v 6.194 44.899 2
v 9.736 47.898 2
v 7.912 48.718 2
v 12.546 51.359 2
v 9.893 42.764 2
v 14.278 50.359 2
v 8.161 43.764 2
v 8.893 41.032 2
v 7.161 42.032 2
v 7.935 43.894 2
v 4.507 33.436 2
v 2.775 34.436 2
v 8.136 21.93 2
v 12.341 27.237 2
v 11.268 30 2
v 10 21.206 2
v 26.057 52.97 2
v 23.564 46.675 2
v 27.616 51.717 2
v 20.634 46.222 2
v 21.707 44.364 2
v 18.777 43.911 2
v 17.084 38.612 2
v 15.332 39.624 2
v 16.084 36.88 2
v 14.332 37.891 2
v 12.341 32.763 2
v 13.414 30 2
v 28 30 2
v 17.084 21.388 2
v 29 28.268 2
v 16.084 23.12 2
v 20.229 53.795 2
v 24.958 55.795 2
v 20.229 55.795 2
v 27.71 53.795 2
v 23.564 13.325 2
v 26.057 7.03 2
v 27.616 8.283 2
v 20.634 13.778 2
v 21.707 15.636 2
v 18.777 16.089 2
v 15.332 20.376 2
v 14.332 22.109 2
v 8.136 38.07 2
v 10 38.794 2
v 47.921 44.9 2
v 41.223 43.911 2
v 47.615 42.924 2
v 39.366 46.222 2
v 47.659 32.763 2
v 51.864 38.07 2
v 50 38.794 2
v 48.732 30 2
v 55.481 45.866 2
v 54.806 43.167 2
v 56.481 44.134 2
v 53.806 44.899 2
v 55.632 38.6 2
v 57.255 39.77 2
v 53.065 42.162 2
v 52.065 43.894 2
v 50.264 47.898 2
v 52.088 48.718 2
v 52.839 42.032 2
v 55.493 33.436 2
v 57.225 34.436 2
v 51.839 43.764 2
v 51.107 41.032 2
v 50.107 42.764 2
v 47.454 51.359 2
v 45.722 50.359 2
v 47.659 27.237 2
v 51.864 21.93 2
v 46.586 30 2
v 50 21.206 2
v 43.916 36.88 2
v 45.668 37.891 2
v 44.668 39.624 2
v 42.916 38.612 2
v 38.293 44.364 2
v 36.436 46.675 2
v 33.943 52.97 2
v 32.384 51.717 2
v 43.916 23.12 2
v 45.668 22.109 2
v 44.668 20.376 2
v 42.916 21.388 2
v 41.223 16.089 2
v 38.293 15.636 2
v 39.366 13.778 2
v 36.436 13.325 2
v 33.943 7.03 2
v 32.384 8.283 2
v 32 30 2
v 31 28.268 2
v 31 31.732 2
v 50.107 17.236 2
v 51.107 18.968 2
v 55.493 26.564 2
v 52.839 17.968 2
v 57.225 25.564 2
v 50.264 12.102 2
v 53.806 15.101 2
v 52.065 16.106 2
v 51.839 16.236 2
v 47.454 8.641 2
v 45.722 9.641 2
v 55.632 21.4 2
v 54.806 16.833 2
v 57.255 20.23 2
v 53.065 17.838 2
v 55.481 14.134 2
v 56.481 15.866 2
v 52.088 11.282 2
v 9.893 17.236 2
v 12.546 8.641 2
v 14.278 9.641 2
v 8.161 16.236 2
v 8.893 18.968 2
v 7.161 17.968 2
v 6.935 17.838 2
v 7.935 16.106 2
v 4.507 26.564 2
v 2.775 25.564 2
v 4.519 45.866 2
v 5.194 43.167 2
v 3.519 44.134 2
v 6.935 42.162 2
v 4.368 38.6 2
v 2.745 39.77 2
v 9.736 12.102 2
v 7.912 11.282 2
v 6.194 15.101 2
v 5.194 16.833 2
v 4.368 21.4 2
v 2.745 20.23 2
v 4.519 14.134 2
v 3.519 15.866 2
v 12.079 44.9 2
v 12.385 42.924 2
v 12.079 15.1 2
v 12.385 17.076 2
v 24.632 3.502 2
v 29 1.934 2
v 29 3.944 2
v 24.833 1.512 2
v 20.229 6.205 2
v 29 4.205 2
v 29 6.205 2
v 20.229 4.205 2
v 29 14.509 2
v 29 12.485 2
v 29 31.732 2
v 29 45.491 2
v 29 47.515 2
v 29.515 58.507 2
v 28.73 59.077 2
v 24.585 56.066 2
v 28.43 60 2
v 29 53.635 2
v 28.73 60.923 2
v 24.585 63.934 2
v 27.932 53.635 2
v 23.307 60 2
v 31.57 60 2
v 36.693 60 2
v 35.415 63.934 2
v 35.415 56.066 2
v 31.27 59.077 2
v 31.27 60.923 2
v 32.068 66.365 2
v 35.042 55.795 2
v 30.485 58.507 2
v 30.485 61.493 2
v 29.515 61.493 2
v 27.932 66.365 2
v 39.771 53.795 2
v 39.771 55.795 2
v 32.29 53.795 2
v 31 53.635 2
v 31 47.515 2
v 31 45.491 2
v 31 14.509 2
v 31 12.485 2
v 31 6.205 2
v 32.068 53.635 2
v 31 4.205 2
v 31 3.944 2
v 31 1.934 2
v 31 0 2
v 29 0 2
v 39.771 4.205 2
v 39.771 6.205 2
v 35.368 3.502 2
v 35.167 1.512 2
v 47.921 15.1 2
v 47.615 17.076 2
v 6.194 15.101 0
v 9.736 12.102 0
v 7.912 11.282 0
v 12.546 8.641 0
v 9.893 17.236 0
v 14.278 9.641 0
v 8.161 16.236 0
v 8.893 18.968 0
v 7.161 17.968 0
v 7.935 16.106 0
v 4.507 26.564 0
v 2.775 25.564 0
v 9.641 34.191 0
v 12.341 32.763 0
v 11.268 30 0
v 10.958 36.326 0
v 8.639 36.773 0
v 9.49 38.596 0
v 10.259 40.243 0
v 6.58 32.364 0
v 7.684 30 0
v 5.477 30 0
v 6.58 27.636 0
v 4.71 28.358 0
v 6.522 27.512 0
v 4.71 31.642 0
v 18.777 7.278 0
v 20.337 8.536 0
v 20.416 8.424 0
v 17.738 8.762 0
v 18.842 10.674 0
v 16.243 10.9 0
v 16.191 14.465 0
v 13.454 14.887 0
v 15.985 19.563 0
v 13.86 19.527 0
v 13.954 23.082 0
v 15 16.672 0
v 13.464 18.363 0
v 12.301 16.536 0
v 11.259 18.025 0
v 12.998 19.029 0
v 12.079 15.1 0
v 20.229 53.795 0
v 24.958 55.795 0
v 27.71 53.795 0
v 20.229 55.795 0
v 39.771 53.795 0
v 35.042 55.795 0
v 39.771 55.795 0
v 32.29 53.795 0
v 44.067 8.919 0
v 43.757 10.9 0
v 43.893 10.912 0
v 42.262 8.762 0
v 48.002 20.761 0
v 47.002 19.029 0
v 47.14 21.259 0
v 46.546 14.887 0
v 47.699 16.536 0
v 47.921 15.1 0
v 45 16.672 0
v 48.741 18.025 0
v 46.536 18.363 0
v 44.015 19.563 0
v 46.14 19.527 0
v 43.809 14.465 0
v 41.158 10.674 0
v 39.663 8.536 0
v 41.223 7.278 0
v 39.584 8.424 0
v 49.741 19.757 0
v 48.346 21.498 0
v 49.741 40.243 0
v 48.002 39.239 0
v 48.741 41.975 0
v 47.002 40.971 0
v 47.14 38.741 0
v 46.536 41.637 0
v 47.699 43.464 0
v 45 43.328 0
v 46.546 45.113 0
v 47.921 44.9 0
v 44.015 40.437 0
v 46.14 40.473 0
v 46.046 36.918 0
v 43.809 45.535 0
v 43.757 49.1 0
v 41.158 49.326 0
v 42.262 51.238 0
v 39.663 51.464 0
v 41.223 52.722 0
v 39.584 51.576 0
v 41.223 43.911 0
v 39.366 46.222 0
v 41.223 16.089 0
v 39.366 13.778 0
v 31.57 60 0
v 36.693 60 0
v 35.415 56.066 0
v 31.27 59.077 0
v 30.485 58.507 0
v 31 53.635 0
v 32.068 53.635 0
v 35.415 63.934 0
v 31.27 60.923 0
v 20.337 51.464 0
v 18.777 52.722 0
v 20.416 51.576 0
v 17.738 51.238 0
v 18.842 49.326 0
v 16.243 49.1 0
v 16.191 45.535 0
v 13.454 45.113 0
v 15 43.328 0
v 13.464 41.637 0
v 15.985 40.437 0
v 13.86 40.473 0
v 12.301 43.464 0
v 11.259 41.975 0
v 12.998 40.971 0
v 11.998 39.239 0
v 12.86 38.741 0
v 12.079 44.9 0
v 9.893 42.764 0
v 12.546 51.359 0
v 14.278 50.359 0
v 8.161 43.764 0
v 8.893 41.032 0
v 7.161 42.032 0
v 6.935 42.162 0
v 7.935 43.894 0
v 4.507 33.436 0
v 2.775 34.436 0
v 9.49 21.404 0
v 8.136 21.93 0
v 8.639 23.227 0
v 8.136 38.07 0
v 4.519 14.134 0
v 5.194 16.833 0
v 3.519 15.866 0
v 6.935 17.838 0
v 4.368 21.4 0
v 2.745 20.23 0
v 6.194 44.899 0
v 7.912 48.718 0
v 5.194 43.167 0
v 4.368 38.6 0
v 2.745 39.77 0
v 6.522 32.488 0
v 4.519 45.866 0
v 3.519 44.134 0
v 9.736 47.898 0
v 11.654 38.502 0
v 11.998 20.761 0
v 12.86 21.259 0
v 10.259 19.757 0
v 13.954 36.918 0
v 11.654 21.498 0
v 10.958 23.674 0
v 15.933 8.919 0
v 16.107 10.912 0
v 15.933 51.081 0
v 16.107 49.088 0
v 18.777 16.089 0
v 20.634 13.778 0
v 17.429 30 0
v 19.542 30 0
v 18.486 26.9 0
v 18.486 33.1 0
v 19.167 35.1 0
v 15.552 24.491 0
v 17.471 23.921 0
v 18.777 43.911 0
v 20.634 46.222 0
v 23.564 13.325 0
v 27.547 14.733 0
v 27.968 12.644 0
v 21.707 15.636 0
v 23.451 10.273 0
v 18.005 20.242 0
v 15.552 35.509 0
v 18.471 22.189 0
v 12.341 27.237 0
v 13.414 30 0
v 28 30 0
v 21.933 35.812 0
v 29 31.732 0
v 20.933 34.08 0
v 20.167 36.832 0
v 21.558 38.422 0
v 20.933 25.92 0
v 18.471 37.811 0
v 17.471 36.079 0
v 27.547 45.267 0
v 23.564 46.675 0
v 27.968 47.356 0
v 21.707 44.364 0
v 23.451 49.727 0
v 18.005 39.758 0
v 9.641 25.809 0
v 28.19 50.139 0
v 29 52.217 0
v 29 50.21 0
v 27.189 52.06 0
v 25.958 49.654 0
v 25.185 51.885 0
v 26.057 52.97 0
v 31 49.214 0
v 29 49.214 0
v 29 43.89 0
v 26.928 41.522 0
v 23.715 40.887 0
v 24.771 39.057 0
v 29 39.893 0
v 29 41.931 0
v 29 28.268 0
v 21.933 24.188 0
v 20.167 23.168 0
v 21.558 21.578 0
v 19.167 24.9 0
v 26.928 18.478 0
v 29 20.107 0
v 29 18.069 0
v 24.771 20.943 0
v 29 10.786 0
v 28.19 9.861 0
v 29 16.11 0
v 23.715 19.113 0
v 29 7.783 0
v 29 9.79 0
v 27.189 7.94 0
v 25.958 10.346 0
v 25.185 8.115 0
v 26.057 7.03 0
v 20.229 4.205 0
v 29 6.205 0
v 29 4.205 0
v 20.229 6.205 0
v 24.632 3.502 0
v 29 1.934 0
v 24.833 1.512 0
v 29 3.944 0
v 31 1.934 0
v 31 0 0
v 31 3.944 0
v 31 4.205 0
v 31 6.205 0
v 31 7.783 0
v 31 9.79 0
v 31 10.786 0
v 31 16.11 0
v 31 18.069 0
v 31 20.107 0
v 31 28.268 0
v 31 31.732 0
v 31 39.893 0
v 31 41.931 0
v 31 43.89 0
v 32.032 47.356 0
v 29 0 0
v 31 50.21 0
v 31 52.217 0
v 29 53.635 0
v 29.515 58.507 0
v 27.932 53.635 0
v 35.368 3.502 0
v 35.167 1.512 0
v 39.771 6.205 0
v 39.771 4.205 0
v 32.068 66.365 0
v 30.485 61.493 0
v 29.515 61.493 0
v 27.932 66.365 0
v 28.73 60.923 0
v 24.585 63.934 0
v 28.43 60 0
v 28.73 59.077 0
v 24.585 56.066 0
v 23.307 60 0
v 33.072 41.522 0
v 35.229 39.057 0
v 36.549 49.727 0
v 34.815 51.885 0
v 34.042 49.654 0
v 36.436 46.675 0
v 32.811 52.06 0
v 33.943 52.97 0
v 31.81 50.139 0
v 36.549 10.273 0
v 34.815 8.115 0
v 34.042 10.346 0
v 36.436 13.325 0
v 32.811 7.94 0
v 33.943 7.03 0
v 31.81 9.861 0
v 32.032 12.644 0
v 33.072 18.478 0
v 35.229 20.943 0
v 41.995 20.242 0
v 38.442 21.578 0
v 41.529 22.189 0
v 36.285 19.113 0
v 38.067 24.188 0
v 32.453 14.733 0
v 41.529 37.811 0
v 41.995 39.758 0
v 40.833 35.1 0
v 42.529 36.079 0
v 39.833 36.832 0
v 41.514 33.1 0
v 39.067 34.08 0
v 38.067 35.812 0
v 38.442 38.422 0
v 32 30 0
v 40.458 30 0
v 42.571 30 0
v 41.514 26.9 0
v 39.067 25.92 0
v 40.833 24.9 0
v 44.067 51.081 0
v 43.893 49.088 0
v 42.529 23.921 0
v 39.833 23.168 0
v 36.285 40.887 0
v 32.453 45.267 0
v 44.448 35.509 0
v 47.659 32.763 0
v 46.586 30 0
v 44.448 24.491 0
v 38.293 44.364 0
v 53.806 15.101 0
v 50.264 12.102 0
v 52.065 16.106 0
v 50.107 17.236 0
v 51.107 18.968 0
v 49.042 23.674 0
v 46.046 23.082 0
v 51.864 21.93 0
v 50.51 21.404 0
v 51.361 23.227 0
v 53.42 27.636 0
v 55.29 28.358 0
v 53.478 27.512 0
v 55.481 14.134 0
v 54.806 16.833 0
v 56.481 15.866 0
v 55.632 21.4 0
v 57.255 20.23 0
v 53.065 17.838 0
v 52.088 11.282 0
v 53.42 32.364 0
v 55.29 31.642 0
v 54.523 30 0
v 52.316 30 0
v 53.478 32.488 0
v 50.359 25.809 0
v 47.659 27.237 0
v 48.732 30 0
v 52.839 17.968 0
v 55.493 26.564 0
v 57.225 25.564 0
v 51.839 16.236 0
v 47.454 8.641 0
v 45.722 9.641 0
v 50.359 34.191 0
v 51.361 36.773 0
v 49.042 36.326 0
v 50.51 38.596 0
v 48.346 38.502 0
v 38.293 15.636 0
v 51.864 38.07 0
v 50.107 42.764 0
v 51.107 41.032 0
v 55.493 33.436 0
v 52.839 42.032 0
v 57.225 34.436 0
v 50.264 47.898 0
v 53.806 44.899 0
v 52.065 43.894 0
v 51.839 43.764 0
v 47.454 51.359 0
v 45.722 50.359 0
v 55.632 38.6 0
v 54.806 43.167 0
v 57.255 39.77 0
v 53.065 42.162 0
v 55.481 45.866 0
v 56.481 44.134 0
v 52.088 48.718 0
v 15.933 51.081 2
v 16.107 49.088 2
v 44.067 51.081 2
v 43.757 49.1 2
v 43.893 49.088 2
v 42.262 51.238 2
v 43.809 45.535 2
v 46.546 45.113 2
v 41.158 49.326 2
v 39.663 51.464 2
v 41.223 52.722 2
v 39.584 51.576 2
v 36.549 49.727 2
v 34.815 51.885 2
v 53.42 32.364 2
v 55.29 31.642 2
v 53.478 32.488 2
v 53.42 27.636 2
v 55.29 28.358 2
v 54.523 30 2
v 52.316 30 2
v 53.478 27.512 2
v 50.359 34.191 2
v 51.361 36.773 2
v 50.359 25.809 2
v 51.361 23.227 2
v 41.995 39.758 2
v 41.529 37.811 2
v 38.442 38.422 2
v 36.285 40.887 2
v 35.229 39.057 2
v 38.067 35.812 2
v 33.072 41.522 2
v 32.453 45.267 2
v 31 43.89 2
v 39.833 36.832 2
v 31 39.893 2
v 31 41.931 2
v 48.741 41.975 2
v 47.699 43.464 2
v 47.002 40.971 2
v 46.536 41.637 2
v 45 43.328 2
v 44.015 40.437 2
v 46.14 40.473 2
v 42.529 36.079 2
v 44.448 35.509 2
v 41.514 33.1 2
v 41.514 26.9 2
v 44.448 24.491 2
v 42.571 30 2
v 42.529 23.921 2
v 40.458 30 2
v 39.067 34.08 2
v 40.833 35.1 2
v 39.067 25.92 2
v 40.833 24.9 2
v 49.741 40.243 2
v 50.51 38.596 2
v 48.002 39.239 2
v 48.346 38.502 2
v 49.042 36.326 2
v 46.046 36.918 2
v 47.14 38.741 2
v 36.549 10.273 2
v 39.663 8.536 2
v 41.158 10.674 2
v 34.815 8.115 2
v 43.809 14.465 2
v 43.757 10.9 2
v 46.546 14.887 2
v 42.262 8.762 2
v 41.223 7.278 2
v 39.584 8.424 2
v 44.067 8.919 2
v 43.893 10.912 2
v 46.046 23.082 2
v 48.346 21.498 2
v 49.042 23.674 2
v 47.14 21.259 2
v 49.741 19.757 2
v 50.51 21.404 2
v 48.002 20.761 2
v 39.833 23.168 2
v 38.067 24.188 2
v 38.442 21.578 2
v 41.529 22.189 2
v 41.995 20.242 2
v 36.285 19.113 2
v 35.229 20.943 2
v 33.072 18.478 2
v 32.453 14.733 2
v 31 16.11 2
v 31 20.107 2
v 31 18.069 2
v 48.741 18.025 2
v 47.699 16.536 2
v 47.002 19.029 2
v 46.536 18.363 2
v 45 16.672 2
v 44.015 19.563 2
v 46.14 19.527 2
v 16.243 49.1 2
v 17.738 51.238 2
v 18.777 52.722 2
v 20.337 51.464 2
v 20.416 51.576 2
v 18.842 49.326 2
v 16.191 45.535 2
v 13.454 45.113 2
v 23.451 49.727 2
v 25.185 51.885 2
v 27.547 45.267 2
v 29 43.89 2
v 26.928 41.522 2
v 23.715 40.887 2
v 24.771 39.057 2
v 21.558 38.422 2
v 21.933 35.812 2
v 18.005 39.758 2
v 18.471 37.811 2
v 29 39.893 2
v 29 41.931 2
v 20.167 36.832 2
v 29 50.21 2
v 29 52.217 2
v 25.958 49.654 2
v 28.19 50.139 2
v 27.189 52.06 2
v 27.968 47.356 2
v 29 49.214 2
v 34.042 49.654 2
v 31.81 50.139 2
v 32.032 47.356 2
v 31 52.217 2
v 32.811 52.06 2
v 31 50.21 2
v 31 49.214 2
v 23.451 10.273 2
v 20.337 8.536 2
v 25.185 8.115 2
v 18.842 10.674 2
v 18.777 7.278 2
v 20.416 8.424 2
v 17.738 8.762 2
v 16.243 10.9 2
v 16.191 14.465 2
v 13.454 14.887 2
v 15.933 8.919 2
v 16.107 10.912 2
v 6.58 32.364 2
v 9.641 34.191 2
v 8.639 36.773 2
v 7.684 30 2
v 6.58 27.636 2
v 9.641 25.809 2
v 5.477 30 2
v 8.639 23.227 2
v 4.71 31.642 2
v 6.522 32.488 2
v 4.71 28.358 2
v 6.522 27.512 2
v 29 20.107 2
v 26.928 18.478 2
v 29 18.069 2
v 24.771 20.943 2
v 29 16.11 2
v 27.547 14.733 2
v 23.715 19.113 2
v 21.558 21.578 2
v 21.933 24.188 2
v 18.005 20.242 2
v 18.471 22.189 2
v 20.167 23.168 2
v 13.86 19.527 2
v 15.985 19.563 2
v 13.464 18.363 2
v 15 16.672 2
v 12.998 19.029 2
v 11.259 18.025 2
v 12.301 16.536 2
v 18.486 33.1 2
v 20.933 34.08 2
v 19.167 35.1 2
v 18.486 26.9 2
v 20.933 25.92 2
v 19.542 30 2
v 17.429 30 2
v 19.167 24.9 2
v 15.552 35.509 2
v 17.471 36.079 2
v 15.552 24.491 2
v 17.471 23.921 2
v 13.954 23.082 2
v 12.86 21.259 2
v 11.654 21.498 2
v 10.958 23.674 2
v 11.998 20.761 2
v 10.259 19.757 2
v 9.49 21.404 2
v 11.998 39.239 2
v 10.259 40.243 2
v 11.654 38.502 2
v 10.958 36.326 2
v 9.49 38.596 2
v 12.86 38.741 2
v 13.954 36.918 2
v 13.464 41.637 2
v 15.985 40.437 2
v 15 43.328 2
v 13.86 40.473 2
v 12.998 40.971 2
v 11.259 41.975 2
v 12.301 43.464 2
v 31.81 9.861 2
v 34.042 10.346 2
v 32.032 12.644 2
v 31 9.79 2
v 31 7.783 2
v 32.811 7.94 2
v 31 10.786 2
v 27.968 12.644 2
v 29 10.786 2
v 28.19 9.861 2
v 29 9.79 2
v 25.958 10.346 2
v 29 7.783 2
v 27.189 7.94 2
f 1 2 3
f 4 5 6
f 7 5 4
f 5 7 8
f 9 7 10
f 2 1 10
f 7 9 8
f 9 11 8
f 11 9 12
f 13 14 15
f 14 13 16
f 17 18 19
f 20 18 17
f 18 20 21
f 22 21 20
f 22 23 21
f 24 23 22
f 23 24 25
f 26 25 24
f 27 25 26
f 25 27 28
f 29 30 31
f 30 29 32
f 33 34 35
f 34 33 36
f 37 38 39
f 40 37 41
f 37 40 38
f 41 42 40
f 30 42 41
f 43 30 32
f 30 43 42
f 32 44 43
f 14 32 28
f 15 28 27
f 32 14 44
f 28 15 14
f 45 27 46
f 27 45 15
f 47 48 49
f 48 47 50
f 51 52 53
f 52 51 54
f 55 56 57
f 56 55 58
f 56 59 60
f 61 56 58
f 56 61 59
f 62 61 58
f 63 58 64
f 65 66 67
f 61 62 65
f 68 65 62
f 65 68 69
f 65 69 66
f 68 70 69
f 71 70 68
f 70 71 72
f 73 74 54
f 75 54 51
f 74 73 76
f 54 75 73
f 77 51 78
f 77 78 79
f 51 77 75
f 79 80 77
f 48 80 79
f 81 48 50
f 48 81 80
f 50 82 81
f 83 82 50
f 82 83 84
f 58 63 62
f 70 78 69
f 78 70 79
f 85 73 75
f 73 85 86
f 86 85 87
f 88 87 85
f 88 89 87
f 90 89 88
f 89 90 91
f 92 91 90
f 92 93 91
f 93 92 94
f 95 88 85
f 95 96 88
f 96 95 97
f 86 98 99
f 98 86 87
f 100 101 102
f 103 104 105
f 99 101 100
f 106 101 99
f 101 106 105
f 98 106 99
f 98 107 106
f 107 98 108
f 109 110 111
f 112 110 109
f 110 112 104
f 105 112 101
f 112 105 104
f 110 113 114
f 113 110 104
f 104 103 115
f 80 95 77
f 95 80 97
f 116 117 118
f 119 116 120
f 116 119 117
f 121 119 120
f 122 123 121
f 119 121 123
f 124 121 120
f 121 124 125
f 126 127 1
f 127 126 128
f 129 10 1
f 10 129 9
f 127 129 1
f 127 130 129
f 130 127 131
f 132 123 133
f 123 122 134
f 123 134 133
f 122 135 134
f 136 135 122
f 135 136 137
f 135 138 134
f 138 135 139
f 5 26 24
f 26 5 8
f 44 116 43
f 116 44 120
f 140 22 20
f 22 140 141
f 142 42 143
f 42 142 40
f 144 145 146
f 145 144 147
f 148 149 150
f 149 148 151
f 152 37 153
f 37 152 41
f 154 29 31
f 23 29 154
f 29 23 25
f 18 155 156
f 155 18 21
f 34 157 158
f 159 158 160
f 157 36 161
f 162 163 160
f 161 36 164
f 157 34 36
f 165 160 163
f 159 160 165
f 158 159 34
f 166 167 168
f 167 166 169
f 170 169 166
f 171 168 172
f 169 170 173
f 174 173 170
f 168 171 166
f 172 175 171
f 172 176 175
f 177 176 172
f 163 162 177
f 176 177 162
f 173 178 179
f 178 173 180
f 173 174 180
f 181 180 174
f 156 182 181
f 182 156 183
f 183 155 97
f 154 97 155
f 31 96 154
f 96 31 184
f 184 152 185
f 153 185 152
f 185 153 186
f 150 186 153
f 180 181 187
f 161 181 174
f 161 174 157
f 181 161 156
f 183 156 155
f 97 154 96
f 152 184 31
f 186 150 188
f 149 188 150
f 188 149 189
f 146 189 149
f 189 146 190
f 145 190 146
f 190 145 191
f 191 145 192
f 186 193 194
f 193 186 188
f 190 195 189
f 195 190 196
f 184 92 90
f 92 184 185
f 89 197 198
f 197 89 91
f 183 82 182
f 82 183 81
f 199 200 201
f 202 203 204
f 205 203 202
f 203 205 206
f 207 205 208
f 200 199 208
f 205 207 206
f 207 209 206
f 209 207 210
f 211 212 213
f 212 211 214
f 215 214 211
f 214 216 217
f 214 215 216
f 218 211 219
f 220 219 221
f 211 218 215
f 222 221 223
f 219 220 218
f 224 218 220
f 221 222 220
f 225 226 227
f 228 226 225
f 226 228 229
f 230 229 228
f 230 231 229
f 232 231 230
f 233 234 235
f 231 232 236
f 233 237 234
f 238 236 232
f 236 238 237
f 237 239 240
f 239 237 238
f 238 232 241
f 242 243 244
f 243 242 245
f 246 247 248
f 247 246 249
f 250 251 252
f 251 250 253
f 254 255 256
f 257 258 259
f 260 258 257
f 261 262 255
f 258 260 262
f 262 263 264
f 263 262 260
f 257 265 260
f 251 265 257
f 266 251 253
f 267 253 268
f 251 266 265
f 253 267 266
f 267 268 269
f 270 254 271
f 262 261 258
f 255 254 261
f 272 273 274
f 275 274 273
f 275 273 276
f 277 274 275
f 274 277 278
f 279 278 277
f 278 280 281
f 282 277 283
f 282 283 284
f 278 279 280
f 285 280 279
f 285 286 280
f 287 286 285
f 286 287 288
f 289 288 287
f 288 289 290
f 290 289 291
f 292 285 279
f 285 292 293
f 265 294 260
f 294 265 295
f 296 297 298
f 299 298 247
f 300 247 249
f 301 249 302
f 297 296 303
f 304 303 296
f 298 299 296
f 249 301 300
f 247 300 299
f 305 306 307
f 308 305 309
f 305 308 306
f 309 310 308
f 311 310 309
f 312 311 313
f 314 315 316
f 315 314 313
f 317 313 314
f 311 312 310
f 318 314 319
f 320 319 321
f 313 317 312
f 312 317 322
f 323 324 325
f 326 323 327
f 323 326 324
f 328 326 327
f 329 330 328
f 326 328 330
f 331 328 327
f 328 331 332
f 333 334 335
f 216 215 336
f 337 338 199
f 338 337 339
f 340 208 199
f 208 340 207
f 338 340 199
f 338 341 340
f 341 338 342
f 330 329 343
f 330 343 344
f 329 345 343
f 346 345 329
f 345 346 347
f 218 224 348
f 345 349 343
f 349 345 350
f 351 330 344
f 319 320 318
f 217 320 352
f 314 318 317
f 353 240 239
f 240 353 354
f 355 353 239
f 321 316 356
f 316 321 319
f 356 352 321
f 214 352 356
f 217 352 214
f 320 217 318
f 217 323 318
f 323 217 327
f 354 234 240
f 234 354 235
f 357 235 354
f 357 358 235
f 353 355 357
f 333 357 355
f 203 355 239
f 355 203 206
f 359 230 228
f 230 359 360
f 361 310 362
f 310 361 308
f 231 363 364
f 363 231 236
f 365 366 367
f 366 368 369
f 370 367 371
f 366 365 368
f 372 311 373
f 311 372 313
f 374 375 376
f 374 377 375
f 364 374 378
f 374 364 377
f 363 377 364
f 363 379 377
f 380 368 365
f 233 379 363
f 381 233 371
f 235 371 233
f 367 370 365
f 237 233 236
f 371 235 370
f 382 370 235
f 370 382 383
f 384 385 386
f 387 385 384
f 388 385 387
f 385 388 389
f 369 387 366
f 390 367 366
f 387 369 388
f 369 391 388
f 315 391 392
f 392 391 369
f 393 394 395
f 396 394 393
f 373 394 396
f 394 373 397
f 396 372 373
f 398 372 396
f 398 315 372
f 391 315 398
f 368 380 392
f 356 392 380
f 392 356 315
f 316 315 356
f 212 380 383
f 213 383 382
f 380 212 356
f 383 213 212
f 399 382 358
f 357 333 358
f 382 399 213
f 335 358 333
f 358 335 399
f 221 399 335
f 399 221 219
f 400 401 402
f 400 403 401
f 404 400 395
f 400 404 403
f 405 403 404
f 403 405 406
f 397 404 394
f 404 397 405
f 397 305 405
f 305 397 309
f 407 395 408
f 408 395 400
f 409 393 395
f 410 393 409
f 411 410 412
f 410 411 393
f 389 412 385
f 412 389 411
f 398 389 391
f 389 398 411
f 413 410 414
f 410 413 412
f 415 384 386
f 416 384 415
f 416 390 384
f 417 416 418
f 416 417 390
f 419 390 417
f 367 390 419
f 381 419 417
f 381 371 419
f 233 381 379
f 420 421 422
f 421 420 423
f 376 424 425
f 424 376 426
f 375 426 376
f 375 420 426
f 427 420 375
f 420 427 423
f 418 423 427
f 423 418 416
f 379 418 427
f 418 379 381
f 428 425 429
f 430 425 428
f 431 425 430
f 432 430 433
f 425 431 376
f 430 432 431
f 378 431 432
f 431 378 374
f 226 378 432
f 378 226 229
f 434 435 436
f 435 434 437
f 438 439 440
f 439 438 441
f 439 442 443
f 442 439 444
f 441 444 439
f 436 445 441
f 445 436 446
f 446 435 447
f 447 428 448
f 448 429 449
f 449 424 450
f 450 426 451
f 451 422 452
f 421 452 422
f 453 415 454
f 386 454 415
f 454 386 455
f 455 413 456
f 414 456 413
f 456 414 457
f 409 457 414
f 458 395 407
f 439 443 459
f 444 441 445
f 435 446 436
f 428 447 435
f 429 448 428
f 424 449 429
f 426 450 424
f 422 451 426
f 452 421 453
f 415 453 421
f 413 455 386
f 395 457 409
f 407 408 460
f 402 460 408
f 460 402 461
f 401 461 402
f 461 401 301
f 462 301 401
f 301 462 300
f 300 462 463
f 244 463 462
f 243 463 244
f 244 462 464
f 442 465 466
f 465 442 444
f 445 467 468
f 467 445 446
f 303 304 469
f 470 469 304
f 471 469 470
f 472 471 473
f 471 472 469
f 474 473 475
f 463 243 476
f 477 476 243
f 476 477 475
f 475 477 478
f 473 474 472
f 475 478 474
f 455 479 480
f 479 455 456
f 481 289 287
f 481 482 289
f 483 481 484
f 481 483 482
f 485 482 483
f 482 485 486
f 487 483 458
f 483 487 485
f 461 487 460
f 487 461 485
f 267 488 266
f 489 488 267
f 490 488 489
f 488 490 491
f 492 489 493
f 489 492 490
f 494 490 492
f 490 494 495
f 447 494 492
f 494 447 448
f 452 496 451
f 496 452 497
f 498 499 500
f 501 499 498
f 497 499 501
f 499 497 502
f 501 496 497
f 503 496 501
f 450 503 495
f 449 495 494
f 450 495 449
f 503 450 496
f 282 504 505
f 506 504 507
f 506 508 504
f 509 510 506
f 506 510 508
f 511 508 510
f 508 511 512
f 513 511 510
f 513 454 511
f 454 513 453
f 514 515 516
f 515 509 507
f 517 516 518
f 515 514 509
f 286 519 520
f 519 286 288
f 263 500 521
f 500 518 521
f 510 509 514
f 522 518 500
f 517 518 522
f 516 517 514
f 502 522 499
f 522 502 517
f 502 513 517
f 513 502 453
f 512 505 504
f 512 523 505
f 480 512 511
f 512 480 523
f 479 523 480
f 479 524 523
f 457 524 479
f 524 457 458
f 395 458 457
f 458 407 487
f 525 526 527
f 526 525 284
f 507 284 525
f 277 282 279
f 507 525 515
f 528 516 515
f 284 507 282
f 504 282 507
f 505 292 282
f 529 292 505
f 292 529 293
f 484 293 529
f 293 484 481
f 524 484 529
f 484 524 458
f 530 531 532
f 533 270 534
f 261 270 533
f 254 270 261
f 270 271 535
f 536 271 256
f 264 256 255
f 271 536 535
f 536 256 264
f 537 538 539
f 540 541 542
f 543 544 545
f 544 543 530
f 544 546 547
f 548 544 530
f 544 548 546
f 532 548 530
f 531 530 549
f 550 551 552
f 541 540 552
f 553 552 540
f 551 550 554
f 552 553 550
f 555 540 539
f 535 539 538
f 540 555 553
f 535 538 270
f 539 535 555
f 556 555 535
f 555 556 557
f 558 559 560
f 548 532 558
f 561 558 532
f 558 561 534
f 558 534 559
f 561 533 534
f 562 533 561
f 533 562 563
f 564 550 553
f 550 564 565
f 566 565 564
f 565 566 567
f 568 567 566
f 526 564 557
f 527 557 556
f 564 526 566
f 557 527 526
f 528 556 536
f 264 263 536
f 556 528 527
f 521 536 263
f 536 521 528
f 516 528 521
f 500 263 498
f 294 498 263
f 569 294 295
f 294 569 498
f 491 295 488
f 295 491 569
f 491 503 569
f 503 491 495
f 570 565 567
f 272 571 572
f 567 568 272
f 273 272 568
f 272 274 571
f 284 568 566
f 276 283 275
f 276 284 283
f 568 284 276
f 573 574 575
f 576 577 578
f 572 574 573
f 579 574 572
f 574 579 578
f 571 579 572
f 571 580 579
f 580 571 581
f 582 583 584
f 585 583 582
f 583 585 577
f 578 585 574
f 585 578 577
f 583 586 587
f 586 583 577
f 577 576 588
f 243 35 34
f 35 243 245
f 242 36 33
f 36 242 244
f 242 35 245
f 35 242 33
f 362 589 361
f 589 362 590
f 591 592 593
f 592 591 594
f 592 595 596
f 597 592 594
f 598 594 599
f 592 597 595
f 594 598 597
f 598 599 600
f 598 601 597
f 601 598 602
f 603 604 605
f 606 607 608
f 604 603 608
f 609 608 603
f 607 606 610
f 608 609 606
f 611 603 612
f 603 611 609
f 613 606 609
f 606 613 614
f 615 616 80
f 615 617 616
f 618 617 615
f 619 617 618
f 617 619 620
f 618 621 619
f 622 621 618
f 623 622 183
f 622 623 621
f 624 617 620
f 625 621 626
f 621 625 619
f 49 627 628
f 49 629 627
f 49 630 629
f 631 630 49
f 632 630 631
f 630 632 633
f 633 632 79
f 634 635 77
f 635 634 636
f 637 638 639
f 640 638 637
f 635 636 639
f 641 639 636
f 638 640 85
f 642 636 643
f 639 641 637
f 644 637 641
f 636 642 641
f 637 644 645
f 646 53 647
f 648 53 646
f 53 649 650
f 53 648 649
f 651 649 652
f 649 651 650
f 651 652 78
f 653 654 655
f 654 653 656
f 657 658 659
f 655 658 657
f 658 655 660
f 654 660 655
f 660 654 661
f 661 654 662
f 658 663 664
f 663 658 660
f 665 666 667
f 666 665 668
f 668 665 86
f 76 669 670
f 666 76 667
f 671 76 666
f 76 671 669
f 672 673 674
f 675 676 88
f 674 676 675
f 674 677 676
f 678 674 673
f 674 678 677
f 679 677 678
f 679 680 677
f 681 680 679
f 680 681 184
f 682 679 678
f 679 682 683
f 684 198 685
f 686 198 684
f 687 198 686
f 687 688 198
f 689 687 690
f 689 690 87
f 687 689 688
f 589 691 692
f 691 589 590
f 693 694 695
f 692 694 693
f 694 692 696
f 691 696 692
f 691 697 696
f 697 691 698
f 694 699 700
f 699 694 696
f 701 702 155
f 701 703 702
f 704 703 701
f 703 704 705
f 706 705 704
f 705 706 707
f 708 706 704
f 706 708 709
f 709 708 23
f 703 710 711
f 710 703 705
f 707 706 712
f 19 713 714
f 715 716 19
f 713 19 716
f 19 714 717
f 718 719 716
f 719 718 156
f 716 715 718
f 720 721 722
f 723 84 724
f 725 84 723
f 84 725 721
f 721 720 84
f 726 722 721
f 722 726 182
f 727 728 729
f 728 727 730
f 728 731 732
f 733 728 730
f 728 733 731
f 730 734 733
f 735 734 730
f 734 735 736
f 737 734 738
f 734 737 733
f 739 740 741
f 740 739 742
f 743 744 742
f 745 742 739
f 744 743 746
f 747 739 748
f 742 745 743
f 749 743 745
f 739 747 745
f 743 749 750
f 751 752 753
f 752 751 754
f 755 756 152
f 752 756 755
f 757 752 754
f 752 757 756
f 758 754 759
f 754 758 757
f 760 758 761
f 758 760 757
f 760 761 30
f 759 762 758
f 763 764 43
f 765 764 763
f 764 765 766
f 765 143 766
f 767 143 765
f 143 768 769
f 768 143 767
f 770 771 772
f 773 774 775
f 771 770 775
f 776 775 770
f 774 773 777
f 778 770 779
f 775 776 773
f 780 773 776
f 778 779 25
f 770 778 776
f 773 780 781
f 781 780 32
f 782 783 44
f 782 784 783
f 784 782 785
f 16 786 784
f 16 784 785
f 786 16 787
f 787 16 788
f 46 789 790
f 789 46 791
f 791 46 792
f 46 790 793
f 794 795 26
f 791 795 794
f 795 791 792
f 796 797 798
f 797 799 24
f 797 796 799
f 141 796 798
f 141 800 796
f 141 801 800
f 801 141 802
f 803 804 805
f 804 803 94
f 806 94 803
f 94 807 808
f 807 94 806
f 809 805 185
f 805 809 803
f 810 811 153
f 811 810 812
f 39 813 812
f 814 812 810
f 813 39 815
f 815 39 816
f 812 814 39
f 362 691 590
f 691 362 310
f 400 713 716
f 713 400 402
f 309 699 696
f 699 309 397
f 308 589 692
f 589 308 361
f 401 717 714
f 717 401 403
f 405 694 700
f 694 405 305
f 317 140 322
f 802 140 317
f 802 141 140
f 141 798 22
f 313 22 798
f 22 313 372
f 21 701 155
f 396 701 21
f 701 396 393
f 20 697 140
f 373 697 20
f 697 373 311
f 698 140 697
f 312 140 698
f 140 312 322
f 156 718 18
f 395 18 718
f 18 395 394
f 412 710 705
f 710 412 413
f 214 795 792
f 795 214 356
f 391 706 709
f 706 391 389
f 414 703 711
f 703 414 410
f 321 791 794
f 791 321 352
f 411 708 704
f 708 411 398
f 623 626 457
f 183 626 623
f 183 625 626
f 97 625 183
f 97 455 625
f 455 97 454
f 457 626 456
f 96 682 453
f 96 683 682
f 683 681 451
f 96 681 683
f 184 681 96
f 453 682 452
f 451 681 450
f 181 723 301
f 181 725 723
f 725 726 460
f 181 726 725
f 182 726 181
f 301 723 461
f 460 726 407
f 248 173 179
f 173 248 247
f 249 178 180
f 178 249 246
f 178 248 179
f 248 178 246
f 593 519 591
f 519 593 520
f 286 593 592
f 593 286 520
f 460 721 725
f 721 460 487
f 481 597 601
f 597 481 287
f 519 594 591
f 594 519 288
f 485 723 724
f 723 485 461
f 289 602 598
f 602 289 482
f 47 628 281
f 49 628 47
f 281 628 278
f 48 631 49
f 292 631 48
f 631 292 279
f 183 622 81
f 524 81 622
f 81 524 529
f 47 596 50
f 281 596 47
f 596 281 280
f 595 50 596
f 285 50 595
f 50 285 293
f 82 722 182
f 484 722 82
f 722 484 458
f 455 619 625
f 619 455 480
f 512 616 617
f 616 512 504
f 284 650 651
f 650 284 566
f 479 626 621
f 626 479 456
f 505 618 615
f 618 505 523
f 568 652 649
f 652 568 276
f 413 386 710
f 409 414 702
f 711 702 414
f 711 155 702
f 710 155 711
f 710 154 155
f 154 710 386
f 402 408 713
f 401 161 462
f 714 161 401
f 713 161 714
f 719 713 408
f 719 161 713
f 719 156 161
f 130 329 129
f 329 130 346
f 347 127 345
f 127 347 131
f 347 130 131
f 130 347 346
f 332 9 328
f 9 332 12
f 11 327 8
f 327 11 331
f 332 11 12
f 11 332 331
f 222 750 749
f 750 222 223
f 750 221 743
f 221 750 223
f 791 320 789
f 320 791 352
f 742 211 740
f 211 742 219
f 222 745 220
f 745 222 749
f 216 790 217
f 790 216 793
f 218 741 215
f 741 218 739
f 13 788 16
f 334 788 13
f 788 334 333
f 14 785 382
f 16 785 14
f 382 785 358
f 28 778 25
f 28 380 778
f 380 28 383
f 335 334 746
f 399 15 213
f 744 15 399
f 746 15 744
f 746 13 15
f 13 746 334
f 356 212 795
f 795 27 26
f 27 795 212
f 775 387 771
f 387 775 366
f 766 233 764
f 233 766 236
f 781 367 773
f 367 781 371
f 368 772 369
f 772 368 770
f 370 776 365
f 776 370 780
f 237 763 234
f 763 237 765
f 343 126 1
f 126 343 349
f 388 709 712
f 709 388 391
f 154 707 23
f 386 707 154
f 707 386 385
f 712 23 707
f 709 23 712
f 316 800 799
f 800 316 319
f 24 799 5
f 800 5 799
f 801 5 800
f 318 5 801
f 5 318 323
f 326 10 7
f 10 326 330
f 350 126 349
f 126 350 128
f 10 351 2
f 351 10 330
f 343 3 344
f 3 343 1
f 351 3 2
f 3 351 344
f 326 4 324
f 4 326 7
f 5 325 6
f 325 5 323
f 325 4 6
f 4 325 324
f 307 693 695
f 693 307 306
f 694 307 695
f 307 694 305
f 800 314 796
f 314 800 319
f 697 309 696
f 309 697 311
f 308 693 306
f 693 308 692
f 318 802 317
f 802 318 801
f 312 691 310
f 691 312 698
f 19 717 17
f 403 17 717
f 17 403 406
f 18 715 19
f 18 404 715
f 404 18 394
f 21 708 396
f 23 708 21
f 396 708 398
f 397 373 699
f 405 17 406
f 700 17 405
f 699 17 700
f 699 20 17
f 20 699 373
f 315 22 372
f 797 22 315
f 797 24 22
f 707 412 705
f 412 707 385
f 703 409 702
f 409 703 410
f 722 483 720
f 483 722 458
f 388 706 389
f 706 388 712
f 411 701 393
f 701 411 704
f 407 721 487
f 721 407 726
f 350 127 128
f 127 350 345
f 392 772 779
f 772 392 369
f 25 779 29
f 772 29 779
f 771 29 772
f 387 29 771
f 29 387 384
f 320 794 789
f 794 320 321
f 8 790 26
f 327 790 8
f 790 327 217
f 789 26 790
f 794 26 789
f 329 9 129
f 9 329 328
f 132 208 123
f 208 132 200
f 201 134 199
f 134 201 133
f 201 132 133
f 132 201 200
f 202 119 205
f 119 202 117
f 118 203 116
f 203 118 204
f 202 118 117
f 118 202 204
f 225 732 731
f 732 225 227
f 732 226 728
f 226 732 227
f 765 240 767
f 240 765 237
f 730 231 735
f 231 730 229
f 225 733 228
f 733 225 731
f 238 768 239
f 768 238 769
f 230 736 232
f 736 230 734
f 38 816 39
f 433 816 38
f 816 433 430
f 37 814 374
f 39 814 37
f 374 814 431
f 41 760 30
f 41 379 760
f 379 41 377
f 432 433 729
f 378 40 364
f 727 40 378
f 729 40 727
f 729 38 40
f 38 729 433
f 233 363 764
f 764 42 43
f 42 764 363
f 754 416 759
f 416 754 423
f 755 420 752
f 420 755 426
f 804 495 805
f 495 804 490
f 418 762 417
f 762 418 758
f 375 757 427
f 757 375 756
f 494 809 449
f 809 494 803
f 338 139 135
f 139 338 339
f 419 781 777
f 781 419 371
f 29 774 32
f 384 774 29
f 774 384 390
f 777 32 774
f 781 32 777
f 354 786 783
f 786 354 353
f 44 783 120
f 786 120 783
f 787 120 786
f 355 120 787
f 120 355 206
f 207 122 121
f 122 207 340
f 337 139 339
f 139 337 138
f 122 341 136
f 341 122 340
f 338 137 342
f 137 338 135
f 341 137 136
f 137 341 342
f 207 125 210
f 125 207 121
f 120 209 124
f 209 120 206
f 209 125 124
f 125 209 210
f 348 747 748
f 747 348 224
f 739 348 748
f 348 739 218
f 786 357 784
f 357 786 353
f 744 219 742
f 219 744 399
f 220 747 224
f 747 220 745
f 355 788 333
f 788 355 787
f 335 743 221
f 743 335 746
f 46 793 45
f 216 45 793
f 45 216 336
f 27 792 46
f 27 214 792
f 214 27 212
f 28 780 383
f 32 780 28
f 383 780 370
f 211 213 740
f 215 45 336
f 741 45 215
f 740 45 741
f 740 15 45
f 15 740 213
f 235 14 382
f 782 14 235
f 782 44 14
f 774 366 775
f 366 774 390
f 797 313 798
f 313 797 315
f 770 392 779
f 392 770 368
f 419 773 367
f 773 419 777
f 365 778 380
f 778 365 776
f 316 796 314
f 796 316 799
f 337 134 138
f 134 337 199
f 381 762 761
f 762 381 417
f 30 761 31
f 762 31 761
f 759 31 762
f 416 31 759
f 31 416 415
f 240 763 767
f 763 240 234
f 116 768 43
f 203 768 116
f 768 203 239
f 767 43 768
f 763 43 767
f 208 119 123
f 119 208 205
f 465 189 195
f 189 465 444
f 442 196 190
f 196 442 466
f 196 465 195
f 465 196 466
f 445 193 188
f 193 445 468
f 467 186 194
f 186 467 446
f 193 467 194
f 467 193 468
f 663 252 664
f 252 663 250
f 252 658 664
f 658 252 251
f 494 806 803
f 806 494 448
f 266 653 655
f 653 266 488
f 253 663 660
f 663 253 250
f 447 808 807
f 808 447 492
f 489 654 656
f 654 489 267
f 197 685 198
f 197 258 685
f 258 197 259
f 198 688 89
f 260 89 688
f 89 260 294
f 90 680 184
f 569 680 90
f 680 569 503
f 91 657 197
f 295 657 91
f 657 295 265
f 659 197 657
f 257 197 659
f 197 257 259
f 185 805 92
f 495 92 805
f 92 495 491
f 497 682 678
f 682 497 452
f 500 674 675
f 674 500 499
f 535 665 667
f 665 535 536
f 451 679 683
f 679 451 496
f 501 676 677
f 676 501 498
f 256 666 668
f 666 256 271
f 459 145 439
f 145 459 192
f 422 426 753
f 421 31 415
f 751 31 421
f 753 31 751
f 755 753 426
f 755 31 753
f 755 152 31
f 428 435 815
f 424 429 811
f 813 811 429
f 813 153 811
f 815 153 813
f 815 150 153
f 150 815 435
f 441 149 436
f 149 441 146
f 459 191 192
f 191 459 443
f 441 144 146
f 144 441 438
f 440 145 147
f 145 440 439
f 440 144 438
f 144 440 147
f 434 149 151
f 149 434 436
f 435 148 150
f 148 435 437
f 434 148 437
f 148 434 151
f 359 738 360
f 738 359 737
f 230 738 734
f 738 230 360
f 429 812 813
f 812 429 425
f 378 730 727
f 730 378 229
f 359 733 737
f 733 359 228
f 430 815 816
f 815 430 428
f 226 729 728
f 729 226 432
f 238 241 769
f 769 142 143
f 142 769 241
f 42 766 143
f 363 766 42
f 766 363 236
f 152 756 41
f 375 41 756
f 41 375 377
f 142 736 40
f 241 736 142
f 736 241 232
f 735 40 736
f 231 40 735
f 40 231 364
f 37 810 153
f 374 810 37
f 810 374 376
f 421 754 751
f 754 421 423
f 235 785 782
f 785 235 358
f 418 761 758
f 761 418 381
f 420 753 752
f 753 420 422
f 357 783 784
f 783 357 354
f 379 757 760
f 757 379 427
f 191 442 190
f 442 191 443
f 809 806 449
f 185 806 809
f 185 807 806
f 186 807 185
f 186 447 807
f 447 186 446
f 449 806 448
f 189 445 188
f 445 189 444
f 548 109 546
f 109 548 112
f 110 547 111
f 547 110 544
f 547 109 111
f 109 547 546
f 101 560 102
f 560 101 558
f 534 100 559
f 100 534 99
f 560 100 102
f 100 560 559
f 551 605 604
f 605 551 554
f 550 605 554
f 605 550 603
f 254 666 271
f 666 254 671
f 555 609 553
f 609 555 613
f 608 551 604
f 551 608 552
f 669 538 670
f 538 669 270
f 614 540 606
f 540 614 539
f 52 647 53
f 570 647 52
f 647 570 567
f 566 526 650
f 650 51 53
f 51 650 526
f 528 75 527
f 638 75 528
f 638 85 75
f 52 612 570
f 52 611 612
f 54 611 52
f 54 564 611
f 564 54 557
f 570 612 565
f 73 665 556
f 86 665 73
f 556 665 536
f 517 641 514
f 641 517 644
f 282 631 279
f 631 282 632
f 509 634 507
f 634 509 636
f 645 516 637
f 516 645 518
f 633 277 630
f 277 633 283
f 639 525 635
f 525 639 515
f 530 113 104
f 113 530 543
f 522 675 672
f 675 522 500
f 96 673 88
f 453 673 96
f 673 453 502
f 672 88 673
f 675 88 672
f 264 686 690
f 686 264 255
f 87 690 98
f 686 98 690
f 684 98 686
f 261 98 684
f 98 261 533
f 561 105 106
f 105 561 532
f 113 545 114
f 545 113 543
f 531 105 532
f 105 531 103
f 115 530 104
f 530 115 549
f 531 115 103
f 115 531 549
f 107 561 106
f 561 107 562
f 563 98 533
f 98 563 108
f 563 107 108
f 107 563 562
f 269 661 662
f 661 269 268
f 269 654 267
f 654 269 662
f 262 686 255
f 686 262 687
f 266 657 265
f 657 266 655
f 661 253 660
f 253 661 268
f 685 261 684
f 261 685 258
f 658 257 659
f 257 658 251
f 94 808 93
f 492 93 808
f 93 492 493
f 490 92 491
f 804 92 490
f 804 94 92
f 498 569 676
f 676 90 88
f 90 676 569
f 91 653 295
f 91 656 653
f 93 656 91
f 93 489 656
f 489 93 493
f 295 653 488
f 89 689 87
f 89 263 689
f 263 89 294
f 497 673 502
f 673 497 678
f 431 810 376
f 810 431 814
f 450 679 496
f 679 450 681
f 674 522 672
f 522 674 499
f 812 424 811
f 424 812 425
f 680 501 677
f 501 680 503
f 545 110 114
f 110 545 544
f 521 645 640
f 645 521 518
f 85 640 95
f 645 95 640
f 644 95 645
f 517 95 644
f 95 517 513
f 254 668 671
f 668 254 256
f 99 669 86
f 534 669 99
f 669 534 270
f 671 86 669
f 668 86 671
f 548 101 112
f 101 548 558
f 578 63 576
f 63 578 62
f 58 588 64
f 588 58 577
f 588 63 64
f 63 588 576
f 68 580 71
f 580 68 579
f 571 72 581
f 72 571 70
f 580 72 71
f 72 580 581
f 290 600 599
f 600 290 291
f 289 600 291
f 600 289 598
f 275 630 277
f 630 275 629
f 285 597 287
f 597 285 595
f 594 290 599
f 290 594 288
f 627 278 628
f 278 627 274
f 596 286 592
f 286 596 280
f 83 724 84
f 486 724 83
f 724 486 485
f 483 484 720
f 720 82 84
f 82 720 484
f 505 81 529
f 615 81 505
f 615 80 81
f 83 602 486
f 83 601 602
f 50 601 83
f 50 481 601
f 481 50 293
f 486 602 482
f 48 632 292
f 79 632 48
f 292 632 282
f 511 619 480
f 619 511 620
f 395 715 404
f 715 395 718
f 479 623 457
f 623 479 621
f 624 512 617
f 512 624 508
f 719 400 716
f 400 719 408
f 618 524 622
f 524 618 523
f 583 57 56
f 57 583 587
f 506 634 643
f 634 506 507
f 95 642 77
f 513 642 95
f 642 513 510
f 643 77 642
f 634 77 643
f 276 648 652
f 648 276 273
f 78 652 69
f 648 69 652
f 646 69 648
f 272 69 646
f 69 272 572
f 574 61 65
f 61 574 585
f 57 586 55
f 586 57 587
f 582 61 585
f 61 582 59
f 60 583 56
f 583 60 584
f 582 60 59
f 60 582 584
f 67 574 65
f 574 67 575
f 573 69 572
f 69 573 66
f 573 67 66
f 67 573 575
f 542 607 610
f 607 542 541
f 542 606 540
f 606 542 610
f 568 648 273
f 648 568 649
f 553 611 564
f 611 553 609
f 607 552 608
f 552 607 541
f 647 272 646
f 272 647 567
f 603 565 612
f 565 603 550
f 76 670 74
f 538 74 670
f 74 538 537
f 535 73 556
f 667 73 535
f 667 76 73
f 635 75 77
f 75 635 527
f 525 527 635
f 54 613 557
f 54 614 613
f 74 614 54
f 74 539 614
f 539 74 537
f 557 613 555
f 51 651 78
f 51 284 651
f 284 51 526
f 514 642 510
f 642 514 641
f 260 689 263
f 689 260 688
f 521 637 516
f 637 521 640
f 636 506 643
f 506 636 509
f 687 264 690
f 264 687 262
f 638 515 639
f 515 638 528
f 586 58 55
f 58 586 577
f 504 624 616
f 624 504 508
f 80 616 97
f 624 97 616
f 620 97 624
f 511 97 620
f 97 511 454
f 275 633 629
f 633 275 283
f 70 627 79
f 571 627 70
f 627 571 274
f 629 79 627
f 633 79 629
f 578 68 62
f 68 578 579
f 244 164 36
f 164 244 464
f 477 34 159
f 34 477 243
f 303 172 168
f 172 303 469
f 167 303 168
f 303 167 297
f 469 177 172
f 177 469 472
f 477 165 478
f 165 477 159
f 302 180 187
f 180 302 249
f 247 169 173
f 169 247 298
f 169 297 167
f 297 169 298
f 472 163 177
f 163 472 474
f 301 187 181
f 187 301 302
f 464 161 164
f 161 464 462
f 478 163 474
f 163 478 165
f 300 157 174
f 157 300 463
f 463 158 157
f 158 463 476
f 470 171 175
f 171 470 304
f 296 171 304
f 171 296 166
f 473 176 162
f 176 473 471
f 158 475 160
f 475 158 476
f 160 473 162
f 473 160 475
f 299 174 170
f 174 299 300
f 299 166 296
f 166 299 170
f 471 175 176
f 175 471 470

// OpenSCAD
//Paramètres commun d'un flocon de neige

Nombre_de_bras = 6;
Longueur_de_la_branche =30;
Angle_des_branches = 24;
Epaisseur_des_branches = 2;
Epaisseur = 2;
Nombre_de_branches = 5; //inférieur à 40
germe =7; //un nombre entre 1 et 7

module tree(Longueur_de_la_branche,Angle_des_branches, Epaisseur_des_branches, Epaisseur,Nombre_de_branches,germe){
	module half_tree(){
		cube([Epaisseur_des_branches/2,Longueur_de_la_branche,Epaisseur]);

		for ( i = [1:Nombre_de_branches]){
			translate([0, (Longueur_de_la_branche-1.3)*cos(i*13), 0]) 
			rotate(Angle_des_branches*(germe+sin(i*15))) 
			cube([Longueur_de_la_branche*sin(i*(2+germe))+0.5, Epaisseur_des_branches, Epaisseur]);
		}
	}

	half_tree(Longueur_de_la_branche, Angle_des_branches,Epaisseur_des_branches, Epaisseur,Nombre_de_branches, germe);
	mirror()half_tree(Longueur_de_la_branche, Angle_des_branches, Epaisseur, Nombre_de_branches, germe);
}

module snowflake(Nombre_de_bras, Longueur_de_la_branche, Angle_des_branches, Epaisseur_des_branches, Epaisseur, Nombre_de_branches, germe){
	hole_dist = Longueur_de_la_branche;
	translate([0,Longueur_de_la_branche,0])cylinder(h=Epaisseur, r=Longueur_de_la_branche*sin(1*(2+germe))+Epaisseur_des_branches, $fn=10);
		for ( i = [0:Nombre_de_bras-1]){
			rotate( i*360/Nombre_de_bras, [0,0,1])
			tree(Longueur_de_la_branche,Angle_des_branches, Epaisseur_des_branches, Epaisseur,Nombre_de_branches,germe);
		}
}

translate([Longueur_de_la_branche,Longueur_de_la_branche,0]){
difference(){

snowflake(
	Nombre_de_bras, 
	Longueur_de_la_branche, 
	Angle_des_branches,
	Epaisseur_des_branches,
	Epaisseur,
	Nombre_de_branches,
	germe
);
translate([0,Longueur_de_la_branche,-2])cylinder(h=Epaisseur*2, r=Longueur_de_la_branche*sin(3), $fn=10);
}
}
